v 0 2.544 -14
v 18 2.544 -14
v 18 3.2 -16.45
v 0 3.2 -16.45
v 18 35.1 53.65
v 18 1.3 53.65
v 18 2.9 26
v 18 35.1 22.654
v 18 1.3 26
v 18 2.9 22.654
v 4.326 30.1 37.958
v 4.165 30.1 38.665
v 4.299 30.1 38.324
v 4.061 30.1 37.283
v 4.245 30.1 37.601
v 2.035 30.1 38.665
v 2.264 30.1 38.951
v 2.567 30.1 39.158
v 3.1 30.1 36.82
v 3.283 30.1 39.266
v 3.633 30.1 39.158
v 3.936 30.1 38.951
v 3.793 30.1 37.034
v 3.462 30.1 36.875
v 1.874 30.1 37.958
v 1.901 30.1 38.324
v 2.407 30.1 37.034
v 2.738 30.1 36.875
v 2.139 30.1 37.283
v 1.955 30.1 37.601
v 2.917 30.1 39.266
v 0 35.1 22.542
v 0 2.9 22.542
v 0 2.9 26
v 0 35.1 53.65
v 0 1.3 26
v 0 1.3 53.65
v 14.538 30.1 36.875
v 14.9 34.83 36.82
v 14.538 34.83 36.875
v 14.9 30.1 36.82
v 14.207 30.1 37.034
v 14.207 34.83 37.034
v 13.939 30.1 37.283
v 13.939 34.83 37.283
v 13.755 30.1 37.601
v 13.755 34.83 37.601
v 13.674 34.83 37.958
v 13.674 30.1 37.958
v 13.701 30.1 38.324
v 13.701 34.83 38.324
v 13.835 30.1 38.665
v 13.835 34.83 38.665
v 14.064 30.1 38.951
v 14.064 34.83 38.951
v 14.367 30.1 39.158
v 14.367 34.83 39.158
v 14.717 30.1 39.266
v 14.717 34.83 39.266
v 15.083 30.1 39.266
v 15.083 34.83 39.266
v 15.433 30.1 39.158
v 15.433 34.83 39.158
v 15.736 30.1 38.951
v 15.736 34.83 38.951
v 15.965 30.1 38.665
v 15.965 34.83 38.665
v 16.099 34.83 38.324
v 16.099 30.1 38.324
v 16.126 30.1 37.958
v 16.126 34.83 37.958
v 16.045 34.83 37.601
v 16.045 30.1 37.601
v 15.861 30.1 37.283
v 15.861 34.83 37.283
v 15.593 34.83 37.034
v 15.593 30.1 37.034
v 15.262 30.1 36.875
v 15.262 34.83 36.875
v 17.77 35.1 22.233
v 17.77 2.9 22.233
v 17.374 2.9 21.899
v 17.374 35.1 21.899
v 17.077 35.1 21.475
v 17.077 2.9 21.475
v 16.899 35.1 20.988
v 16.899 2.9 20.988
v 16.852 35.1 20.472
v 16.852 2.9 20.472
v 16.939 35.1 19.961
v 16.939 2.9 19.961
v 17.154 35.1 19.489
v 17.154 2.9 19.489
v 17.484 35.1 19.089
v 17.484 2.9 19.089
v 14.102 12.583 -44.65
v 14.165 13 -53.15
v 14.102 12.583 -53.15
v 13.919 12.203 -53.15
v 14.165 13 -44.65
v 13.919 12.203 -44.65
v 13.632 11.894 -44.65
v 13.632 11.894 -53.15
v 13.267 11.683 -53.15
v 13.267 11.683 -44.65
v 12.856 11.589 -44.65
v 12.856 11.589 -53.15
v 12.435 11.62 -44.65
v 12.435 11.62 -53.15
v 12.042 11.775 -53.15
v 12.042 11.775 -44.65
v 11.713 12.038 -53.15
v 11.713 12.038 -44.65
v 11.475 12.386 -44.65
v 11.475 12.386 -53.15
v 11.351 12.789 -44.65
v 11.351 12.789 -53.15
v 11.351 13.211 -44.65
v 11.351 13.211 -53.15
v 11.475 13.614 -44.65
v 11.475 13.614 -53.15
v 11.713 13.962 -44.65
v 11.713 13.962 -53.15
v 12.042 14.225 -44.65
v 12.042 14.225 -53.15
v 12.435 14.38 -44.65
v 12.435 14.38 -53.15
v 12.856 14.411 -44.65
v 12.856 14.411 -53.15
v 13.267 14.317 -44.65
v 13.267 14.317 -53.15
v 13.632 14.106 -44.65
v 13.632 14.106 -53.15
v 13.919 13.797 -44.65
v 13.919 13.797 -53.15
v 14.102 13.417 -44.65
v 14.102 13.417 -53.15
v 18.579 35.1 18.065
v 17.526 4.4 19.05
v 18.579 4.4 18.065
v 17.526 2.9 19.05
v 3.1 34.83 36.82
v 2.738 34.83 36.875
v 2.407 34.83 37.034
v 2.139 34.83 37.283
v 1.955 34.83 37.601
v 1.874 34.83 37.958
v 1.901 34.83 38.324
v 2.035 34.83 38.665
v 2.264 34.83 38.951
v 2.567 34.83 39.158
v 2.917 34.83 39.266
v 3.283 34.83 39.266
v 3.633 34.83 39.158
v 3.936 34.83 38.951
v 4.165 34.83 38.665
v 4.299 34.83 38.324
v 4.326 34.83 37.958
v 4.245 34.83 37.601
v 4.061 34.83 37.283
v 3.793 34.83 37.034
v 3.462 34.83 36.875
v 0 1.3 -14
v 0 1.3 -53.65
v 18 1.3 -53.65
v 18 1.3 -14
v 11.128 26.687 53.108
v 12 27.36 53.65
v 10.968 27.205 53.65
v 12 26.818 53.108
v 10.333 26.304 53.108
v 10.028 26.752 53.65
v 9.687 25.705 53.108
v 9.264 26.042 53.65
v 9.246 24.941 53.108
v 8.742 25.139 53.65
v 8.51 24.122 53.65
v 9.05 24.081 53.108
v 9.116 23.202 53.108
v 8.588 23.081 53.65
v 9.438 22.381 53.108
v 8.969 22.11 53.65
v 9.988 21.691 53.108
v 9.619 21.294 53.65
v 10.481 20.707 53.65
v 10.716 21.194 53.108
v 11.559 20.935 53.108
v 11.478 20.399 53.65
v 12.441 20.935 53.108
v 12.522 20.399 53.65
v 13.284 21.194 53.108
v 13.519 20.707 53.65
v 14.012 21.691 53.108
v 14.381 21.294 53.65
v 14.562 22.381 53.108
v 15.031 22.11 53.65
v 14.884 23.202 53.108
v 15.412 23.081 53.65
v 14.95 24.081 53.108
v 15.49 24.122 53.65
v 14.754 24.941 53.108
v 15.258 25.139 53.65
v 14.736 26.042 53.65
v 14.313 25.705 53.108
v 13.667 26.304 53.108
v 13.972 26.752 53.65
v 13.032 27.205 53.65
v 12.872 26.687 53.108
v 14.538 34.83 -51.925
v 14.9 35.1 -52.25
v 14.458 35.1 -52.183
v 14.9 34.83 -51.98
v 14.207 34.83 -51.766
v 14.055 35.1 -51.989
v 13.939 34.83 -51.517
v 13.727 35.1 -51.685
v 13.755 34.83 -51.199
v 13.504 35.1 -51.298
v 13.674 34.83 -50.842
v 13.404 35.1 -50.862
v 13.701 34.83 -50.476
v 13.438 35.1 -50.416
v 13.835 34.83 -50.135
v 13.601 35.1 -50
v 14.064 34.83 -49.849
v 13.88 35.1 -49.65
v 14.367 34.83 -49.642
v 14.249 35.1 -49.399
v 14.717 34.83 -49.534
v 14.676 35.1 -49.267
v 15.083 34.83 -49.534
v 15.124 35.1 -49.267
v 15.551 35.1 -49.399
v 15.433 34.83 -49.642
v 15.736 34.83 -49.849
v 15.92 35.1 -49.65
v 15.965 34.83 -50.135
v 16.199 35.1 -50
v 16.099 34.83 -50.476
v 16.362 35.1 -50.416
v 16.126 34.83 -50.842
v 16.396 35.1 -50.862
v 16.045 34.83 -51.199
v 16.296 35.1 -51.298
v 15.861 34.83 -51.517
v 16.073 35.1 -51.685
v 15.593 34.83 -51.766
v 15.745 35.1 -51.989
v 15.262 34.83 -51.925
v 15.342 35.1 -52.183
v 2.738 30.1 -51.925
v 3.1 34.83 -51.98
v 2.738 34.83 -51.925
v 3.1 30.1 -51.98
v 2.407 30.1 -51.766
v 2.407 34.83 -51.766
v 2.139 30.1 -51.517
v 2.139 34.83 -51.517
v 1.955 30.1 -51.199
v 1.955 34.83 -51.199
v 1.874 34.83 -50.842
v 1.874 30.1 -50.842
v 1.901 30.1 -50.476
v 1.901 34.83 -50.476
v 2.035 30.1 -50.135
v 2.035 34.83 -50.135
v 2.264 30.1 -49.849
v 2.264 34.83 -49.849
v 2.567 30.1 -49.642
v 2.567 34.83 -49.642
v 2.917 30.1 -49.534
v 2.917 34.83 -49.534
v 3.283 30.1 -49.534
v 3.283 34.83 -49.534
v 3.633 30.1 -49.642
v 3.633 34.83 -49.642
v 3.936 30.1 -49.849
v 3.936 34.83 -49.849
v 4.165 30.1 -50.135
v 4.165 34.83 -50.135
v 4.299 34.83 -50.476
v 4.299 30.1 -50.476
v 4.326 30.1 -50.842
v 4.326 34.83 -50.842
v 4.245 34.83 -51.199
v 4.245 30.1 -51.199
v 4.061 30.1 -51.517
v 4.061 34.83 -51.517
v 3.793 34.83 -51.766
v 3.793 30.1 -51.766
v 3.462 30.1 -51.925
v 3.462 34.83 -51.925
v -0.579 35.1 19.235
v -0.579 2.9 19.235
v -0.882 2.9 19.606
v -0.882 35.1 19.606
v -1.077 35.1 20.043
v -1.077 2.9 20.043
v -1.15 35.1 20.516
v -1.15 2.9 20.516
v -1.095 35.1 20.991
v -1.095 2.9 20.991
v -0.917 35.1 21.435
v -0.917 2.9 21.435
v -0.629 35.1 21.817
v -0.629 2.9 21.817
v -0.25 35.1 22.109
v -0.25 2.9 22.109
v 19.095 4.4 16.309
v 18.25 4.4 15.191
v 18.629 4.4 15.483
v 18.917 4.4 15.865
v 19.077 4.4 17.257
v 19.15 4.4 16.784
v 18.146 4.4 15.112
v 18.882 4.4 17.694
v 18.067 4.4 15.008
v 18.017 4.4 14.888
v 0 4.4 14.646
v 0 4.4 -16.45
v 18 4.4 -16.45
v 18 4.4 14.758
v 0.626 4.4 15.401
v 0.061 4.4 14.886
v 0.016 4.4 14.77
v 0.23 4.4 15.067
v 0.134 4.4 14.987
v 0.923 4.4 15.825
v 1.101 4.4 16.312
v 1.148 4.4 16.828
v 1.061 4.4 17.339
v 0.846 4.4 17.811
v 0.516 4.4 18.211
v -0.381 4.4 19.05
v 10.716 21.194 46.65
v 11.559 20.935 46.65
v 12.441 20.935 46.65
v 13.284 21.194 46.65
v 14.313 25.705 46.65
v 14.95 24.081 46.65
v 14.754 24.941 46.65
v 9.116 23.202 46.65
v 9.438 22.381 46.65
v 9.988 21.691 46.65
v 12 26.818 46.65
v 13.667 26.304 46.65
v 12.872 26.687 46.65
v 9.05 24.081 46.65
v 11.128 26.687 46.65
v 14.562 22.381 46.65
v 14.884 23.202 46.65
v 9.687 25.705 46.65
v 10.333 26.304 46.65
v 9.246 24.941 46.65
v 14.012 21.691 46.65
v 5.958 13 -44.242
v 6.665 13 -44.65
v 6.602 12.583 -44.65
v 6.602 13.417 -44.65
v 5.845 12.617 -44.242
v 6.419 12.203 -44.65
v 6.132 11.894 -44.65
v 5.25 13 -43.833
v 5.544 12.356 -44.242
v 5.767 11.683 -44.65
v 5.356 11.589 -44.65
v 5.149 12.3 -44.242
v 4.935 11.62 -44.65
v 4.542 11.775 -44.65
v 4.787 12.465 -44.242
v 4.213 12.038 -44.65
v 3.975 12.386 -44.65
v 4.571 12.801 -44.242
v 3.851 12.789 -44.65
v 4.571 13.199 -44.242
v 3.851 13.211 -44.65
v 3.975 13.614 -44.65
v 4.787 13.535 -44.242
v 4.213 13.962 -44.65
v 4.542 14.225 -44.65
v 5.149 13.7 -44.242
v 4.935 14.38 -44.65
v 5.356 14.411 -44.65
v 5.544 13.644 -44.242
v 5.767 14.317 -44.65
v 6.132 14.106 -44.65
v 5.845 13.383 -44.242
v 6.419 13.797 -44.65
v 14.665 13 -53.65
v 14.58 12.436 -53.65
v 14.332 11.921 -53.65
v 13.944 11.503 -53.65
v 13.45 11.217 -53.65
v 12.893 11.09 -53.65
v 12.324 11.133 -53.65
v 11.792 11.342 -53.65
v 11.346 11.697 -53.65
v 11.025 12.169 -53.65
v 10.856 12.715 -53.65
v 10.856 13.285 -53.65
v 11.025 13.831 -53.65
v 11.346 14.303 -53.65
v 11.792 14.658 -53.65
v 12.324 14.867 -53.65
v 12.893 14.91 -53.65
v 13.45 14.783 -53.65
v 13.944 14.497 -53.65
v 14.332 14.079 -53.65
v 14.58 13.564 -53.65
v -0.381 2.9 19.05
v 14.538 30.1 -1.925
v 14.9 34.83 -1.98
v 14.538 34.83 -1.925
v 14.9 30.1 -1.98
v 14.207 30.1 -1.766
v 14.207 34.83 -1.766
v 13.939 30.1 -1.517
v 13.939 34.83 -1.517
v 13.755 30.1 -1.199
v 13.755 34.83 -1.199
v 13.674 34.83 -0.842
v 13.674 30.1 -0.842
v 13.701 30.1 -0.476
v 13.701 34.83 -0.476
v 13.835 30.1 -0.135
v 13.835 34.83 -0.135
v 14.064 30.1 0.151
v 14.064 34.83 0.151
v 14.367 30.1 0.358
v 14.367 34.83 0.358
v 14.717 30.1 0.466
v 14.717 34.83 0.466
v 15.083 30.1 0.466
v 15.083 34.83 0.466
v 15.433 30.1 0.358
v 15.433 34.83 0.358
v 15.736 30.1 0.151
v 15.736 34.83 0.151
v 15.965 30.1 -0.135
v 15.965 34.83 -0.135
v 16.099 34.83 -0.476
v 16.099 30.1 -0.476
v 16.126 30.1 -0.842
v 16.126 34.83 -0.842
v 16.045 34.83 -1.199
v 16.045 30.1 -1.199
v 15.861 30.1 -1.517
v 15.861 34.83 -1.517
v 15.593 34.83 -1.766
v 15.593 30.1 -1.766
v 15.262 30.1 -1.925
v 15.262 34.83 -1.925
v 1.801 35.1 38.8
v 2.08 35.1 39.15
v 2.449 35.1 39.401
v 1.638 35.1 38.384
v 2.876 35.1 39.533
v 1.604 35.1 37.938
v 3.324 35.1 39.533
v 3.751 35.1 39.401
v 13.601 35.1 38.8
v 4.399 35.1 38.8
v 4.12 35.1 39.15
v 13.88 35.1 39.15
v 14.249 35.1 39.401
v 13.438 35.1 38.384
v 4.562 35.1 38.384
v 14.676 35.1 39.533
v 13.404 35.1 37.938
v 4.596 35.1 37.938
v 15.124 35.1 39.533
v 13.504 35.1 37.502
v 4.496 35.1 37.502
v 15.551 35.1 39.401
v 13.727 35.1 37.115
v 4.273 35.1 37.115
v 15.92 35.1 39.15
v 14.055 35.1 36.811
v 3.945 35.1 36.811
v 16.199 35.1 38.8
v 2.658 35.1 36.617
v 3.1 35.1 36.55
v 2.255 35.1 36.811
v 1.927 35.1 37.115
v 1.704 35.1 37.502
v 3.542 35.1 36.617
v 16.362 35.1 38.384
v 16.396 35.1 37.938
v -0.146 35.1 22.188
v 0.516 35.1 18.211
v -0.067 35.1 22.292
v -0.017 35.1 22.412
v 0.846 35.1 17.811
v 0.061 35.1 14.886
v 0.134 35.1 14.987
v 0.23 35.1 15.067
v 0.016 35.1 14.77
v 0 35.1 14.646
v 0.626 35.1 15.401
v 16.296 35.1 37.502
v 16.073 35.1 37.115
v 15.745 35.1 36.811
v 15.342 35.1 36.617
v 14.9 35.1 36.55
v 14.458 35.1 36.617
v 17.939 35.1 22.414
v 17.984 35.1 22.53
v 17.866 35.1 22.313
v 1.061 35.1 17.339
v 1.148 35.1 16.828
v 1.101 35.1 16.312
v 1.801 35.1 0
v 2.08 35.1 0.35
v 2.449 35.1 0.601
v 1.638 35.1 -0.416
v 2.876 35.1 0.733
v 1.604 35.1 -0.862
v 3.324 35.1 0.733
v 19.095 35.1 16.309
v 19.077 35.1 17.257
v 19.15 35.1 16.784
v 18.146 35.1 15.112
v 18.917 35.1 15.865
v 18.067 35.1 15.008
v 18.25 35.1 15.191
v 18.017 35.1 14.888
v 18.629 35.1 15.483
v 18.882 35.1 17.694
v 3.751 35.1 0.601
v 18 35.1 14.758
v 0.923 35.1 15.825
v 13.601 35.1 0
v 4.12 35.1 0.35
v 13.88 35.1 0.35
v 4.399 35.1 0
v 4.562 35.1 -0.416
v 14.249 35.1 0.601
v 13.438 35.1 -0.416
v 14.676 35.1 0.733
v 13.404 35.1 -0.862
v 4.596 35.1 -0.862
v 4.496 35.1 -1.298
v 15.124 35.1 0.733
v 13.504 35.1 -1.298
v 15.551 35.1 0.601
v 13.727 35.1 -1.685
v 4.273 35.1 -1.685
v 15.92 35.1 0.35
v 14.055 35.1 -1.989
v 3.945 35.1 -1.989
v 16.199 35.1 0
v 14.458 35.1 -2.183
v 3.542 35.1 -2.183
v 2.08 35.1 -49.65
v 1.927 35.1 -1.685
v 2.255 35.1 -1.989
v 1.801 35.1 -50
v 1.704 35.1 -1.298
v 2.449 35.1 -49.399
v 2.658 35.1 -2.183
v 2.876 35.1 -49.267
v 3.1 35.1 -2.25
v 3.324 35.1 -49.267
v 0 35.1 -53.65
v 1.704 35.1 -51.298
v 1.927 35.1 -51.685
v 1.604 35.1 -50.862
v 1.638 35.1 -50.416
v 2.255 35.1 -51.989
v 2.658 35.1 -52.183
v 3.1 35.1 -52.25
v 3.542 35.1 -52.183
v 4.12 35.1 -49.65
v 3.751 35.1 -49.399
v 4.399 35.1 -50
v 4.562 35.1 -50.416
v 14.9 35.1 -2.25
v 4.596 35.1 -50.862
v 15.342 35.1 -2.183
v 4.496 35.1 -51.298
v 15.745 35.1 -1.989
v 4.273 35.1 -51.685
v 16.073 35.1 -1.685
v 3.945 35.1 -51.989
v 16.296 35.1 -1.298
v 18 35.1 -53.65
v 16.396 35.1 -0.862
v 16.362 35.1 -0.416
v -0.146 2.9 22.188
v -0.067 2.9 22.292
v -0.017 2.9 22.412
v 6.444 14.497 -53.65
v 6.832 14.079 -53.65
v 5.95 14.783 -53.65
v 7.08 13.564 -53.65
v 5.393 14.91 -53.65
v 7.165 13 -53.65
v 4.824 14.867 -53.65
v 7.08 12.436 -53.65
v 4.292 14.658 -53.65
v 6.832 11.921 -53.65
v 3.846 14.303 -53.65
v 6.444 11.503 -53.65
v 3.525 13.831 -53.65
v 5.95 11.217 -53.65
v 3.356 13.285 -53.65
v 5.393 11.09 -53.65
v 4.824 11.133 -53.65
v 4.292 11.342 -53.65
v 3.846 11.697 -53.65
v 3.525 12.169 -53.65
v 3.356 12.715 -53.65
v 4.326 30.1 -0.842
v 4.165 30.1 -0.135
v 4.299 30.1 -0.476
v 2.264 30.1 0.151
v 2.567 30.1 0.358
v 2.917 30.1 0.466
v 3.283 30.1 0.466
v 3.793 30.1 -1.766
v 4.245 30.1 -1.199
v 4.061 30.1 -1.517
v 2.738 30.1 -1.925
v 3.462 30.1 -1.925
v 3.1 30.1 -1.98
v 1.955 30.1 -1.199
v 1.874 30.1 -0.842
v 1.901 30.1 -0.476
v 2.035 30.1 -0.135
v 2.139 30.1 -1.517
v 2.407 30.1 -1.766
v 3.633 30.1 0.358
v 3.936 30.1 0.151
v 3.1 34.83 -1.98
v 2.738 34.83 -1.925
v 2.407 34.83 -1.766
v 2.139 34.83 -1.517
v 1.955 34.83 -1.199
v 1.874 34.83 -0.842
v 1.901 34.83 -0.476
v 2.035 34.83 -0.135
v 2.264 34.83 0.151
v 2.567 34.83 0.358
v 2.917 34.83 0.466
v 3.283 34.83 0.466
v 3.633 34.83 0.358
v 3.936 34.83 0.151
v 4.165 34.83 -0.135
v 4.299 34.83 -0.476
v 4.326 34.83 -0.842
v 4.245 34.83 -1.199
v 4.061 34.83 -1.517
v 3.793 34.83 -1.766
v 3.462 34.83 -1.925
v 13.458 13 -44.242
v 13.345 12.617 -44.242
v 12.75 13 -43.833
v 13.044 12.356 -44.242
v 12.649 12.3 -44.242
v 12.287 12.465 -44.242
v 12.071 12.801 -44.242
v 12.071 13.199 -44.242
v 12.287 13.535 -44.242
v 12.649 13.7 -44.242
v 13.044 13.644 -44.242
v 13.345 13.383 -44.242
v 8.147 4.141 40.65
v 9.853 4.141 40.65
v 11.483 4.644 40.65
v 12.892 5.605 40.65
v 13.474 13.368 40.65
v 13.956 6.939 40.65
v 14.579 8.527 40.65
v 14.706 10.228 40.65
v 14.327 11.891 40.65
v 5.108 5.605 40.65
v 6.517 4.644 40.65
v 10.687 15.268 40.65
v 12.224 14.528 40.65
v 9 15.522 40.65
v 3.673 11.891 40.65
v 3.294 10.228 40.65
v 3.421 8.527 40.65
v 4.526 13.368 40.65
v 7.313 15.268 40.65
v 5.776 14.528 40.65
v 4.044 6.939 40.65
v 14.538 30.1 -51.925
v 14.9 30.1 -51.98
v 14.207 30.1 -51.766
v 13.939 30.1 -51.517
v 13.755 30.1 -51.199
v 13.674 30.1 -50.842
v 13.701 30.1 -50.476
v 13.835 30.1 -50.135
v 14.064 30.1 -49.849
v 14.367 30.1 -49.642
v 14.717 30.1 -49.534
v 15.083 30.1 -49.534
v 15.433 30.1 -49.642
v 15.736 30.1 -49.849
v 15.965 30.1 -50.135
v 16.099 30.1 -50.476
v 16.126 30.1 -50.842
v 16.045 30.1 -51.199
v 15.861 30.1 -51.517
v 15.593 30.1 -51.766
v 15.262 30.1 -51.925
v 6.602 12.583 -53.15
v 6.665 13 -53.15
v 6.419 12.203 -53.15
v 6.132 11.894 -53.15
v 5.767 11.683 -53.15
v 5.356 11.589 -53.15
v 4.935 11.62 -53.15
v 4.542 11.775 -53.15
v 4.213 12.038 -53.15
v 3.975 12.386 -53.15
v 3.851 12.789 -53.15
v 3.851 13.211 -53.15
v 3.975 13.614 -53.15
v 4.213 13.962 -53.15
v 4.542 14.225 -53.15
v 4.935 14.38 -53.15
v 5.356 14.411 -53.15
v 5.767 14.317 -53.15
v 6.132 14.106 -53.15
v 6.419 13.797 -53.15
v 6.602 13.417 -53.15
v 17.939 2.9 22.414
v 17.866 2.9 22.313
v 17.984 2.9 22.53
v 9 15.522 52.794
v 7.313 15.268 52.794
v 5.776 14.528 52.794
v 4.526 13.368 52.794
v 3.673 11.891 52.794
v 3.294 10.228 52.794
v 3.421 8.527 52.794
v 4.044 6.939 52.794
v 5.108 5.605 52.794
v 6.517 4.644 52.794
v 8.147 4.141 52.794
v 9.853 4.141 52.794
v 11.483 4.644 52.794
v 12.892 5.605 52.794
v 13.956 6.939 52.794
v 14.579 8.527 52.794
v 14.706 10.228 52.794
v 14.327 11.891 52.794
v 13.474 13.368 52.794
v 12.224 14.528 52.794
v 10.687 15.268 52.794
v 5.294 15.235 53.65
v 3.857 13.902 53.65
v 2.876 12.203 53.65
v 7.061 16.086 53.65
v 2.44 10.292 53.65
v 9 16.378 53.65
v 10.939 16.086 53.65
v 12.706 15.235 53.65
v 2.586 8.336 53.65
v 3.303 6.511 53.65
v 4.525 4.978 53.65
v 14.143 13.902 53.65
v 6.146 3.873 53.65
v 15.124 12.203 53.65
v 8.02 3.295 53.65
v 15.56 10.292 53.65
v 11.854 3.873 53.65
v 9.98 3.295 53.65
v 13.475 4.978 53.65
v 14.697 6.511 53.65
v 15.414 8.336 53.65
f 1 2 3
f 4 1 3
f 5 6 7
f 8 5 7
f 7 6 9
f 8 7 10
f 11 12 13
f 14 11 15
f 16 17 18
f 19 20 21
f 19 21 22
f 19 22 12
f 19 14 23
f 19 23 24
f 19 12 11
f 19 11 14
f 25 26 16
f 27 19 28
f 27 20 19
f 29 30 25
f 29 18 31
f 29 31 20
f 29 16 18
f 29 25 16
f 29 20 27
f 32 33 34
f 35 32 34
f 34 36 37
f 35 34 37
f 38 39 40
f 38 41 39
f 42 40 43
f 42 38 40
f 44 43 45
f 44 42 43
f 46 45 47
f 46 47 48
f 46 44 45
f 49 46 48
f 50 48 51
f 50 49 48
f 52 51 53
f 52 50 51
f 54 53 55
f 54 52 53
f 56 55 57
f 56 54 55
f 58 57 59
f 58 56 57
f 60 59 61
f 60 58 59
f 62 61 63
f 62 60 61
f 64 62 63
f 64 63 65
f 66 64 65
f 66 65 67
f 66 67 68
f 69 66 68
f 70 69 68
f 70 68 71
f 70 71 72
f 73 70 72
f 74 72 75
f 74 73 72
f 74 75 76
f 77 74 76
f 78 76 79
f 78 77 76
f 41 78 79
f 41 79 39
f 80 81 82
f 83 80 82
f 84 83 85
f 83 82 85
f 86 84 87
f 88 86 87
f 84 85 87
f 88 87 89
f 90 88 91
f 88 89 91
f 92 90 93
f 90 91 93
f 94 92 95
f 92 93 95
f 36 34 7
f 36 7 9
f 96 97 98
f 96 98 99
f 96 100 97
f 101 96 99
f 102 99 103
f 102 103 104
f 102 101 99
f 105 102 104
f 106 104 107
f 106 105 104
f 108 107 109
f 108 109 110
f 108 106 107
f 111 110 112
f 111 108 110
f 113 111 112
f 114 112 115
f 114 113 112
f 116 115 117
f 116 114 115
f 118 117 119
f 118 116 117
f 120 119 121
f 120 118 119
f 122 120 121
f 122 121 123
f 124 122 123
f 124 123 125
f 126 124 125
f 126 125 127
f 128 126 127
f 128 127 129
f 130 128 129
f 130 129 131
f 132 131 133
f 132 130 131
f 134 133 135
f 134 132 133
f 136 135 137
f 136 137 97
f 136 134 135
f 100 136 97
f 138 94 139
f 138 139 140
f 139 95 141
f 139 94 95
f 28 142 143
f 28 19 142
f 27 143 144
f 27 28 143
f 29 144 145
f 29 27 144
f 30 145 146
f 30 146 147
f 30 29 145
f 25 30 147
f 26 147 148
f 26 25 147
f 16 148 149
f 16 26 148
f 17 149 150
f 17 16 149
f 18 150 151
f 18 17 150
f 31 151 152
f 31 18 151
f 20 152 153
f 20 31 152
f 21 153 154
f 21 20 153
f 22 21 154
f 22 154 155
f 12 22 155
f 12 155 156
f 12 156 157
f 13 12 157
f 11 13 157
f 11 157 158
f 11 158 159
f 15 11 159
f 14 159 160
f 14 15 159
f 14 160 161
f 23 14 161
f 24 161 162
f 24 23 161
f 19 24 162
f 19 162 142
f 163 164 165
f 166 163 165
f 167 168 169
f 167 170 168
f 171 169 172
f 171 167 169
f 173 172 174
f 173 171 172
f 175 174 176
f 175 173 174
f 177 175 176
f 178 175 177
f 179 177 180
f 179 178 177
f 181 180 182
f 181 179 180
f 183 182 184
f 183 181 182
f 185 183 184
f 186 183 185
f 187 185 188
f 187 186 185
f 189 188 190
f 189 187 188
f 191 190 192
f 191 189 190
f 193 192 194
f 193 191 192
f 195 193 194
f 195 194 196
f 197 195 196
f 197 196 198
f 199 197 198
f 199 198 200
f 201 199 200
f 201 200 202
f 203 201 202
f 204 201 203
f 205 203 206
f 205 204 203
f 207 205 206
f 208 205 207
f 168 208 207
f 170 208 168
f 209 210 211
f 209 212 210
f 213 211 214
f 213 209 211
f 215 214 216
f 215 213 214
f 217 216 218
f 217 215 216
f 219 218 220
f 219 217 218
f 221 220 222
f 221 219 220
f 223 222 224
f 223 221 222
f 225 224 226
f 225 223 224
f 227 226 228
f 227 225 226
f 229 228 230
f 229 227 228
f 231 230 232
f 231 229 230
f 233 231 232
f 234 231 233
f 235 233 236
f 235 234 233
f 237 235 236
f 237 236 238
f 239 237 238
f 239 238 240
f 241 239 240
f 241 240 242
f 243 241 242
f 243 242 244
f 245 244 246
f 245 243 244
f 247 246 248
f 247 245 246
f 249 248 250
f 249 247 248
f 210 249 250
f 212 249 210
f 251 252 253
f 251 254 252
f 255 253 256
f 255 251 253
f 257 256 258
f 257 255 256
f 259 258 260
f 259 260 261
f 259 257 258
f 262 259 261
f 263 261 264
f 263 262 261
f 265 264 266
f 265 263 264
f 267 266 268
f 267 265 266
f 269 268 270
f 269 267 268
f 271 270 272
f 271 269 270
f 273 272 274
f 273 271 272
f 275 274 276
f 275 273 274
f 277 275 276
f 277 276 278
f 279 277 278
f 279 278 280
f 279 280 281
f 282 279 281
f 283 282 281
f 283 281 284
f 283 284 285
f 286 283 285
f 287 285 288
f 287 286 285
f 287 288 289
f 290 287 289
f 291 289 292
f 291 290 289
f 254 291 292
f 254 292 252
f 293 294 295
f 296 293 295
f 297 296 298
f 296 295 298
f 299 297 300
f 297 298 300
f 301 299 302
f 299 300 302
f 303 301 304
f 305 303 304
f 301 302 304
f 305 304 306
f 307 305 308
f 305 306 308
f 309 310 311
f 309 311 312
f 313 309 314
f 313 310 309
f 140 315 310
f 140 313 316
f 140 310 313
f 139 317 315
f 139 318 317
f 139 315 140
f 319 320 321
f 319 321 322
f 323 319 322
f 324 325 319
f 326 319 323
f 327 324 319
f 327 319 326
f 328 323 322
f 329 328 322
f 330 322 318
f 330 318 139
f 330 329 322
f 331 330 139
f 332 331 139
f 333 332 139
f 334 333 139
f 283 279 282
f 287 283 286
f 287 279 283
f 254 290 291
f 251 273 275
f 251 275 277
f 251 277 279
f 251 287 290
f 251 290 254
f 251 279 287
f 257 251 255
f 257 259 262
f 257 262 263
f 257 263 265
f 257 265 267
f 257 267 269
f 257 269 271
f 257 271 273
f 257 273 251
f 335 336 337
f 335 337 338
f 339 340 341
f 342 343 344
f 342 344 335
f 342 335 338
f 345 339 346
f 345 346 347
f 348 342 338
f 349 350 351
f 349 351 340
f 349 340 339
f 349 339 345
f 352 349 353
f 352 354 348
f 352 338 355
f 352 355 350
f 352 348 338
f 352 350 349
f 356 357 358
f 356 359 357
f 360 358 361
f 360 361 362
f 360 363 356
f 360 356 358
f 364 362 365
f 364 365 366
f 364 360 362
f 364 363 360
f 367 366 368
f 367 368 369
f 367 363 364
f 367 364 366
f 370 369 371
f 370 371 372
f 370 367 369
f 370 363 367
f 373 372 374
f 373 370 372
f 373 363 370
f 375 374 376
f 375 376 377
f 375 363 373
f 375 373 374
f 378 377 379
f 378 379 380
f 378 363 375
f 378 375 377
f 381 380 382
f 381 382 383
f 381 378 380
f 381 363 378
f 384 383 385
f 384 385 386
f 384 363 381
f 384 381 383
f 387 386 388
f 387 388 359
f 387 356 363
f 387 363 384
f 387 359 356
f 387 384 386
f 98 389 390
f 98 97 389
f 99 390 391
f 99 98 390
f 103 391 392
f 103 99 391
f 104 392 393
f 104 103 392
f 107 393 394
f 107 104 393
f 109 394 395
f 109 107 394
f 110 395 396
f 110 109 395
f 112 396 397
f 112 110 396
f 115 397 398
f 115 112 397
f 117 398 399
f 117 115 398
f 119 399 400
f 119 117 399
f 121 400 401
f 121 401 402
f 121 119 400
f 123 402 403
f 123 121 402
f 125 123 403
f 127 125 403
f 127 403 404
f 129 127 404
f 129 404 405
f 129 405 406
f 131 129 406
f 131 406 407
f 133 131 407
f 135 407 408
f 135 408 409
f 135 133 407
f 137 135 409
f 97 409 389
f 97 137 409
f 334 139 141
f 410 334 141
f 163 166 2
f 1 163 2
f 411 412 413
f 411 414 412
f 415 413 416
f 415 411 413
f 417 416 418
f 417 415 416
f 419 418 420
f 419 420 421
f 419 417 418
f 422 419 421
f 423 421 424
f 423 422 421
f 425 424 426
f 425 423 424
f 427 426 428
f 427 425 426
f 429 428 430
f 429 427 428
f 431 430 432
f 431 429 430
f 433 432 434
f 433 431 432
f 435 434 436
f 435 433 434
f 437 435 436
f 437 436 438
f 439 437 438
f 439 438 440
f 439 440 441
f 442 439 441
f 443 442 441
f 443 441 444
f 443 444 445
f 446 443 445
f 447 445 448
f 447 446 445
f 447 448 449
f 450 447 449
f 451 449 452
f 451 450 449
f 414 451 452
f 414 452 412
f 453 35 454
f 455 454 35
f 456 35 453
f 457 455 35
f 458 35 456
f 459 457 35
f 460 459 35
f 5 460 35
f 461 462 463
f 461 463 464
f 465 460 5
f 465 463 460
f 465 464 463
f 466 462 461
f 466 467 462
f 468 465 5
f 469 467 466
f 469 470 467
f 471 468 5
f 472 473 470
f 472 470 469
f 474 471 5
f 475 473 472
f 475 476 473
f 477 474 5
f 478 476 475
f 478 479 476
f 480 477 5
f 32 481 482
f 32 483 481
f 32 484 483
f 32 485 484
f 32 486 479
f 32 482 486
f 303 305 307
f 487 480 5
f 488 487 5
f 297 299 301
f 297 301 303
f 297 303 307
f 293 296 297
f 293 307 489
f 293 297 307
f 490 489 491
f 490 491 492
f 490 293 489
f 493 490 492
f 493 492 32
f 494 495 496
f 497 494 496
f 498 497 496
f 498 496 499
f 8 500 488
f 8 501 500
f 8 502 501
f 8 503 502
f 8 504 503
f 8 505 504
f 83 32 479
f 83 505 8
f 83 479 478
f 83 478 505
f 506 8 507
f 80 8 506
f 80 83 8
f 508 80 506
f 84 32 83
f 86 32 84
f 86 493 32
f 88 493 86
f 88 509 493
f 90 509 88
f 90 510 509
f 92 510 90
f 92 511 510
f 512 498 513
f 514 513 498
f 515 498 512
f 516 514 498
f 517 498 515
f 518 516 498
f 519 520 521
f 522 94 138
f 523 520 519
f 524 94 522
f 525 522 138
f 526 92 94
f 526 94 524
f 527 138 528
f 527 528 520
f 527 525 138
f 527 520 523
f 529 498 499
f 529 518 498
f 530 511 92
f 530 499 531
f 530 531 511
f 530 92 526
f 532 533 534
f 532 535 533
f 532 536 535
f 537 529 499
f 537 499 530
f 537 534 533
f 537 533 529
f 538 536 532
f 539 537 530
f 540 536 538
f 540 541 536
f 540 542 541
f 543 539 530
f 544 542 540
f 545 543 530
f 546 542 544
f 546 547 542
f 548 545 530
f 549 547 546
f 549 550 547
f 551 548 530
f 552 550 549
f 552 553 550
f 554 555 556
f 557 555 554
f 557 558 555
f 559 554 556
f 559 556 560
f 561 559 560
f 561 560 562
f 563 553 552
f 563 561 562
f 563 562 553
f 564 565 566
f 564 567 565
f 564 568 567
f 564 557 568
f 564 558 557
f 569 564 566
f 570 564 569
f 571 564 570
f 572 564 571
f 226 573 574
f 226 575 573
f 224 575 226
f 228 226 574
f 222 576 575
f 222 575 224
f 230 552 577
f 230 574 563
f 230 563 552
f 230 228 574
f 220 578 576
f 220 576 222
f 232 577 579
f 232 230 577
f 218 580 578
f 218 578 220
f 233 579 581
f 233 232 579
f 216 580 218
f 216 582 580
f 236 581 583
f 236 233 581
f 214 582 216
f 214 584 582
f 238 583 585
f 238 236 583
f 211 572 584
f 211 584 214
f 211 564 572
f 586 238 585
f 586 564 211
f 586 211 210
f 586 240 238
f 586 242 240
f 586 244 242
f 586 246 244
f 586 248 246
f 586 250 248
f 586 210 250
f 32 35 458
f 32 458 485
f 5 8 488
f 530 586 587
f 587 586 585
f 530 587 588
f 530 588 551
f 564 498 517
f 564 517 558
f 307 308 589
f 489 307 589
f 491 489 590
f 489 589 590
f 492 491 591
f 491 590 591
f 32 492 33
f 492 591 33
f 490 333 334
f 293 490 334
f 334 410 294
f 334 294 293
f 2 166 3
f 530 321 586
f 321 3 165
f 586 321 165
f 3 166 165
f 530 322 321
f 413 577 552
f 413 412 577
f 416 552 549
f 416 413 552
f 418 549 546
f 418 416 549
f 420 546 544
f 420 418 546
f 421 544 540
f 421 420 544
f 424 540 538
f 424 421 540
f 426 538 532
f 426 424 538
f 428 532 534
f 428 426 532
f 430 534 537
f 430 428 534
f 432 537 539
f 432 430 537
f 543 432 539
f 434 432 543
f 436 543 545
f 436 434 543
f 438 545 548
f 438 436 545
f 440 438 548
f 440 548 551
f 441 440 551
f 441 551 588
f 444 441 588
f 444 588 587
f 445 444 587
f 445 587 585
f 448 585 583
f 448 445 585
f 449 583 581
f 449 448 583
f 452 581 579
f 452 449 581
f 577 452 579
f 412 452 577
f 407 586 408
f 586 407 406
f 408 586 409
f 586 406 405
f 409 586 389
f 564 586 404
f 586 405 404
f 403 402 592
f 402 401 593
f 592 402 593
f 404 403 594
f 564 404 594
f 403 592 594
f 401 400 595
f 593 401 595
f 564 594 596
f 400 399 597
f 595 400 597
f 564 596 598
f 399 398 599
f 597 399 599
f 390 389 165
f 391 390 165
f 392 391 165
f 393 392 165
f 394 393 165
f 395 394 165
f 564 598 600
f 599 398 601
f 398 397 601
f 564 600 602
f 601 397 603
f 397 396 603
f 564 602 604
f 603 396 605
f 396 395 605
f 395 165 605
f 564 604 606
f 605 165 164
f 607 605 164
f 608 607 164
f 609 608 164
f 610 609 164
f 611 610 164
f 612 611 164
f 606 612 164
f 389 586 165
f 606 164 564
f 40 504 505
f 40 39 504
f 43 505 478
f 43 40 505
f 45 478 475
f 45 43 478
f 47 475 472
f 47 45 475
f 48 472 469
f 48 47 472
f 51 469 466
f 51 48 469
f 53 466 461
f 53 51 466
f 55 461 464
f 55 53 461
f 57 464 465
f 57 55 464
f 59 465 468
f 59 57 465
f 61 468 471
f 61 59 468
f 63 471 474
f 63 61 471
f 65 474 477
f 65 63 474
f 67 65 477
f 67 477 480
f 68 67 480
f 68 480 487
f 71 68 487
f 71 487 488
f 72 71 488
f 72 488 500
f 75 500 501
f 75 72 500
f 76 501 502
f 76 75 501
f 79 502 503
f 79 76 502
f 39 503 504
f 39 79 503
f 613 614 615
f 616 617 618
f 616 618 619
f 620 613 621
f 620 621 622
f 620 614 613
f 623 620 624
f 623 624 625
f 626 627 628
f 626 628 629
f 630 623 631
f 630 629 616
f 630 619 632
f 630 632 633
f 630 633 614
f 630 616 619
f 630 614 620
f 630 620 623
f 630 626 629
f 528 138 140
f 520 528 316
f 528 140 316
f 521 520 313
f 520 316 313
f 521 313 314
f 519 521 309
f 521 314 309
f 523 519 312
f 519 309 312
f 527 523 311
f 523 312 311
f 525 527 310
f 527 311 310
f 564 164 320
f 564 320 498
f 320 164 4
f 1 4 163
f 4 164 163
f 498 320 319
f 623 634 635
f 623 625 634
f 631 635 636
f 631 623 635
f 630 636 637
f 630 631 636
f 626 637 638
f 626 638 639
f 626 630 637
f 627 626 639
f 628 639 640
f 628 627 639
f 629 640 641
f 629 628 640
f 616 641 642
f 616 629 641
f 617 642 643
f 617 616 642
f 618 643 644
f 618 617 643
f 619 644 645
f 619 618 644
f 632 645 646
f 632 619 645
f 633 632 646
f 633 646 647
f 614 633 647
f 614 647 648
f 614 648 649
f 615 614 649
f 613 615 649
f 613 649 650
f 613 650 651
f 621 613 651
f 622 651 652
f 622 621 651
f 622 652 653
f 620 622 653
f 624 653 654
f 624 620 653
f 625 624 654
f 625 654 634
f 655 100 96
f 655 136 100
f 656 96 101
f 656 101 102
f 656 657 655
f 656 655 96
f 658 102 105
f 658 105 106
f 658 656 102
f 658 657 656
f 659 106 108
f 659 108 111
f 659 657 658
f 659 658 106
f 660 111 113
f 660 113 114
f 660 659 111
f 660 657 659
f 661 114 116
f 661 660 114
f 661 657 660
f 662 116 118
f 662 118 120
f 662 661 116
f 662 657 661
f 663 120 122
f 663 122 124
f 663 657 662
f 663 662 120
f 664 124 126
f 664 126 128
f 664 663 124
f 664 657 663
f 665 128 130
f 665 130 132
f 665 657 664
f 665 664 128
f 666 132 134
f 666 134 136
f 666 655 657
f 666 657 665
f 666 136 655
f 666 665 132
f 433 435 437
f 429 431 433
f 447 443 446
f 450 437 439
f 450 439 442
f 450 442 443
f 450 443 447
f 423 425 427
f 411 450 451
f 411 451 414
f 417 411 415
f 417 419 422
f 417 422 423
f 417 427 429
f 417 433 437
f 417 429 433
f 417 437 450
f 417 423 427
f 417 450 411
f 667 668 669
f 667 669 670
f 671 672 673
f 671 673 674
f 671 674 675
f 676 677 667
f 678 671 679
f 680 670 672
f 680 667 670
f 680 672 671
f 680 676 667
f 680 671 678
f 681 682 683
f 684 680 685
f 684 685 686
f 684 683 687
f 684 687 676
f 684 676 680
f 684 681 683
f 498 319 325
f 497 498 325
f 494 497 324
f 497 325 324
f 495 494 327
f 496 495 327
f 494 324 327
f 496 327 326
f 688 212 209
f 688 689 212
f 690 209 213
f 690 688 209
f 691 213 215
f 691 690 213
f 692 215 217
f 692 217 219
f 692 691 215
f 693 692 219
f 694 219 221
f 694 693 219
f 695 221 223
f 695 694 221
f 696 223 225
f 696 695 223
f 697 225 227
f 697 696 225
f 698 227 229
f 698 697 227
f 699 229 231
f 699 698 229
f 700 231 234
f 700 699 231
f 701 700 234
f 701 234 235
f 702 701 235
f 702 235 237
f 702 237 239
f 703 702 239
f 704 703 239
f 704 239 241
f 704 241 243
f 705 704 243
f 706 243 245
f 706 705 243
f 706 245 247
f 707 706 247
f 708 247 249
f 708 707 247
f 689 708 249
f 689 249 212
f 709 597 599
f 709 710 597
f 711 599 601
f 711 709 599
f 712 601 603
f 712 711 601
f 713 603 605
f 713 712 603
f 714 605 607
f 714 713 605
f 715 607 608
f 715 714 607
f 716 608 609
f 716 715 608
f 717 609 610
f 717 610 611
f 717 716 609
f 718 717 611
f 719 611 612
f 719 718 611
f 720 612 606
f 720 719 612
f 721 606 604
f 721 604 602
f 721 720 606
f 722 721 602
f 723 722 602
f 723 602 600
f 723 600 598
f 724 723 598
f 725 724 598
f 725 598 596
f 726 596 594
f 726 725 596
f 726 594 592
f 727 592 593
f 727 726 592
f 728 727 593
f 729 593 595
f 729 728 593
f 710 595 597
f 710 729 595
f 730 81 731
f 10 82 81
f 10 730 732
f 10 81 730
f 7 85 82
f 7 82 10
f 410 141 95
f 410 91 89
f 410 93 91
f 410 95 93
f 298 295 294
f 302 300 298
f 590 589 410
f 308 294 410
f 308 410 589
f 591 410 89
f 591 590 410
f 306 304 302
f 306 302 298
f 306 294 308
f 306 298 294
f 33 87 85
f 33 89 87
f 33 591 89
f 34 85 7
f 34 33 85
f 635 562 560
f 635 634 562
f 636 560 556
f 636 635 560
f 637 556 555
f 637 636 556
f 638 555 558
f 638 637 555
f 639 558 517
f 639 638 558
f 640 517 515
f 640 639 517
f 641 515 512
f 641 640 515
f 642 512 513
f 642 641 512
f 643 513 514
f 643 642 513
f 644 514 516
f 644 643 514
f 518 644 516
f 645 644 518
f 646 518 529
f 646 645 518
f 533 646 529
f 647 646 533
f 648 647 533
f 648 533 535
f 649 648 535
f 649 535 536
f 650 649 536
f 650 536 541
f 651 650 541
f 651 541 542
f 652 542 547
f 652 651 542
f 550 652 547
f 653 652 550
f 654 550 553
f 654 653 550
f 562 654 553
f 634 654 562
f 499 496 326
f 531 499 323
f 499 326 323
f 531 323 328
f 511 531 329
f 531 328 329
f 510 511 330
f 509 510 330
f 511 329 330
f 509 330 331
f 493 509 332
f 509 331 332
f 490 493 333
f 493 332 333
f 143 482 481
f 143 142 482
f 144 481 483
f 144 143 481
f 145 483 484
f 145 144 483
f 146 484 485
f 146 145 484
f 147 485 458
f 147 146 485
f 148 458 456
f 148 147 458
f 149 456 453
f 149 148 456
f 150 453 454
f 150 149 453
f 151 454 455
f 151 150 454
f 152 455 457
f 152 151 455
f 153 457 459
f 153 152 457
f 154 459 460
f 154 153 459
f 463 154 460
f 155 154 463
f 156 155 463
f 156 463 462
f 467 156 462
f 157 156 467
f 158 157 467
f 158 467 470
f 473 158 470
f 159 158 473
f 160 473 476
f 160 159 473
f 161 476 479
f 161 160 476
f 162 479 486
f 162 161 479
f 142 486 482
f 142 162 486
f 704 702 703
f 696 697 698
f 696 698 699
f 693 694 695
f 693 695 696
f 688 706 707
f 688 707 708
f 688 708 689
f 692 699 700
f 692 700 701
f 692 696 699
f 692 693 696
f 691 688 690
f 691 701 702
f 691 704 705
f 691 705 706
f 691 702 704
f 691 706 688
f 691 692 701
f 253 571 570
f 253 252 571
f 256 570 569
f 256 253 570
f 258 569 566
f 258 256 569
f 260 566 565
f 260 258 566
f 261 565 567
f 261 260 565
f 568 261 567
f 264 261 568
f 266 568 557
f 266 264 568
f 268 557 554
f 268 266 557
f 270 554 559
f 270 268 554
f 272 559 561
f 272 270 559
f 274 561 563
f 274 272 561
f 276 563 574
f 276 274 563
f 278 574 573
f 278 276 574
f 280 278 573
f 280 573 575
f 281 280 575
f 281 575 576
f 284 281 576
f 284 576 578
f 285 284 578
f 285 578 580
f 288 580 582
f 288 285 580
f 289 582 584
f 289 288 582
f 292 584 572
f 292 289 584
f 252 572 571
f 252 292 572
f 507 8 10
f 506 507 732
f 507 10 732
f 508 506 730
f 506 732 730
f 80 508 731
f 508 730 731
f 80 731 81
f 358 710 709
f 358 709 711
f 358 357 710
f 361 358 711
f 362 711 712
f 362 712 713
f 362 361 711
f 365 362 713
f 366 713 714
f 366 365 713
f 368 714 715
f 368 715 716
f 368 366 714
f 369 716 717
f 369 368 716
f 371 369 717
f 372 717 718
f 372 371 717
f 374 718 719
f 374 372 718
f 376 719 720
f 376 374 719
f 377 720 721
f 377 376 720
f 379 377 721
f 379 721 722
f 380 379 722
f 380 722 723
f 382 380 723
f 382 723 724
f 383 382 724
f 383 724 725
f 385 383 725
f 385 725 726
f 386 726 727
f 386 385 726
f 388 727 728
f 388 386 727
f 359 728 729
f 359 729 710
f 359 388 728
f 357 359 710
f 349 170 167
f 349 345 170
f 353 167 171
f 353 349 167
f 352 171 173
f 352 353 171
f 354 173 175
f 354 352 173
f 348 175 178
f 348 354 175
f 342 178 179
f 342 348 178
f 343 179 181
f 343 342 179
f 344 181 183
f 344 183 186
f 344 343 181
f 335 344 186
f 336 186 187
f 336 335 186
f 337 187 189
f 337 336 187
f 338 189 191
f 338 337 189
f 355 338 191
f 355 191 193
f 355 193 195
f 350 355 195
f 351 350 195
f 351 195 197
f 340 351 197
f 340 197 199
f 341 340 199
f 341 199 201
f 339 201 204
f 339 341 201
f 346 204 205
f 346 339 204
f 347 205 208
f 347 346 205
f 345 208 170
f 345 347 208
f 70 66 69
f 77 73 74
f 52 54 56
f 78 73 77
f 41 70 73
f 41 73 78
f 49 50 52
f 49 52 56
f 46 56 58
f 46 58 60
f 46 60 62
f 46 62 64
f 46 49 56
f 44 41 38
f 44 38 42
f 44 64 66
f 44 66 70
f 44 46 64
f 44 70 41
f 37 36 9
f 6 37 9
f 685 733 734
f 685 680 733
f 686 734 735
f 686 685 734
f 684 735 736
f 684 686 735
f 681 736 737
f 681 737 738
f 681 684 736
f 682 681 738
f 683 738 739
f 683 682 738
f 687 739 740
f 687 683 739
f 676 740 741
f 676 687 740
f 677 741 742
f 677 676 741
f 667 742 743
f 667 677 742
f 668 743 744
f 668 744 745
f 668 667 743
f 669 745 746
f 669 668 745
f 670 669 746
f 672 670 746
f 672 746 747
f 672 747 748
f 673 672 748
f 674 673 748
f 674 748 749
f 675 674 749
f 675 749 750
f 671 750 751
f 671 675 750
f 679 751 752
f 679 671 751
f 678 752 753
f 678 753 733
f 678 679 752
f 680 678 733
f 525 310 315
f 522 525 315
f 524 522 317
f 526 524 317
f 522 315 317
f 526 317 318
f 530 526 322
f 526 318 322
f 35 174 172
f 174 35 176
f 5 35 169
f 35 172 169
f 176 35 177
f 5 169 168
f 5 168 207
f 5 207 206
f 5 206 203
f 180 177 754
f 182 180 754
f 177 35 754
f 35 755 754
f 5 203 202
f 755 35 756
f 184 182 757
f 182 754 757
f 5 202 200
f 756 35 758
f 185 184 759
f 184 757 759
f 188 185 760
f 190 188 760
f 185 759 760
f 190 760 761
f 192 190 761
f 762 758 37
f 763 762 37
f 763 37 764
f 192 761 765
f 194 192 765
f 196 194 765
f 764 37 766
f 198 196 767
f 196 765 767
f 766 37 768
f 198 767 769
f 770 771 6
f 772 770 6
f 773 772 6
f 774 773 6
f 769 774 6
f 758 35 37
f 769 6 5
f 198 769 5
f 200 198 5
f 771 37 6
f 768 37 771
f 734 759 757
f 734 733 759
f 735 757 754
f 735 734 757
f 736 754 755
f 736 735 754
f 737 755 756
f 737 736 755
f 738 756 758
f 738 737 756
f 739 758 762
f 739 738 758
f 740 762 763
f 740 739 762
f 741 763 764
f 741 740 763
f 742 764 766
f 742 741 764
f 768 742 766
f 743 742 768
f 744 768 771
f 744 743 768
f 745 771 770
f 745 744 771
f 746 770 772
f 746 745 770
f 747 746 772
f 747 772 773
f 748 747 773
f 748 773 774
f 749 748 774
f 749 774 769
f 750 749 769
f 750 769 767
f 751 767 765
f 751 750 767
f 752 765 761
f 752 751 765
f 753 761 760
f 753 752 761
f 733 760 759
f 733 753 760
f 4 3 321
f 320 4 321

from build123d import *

# Parameters (mm, degrees)
BOSS_EXTRUDE1_DEPTH     = 33.8
CUT_EXTRUDE1_DEPTH      = 23
CUT_EXTRUDE1_DEPTH_BACK = 23


with BuildPart() as part:
    # Sketch1 → Boss-Extrude1 (new body)
    with BuildSketch(Plane(origin=(0, 1.3, 0), x_dir=(1, 0, 0), z_dir=(0, 1, 0))):
        with BuildLine():
            Line((0, -22.541858429), (0, -53.65))
            Line((0, -53.65), (18, -53.65))
            Line((18, -53.65), (18, -22.654162541))
            ThreePointArc((18, -22.654162541), (17.938748215, -22.414370958), (17.769999986, -22.233330024))
            ThreePointArc((17.769999986, -22.233330024), (16.858228534, -20.731235829), (17.483912522, -19.089245057))
            Line((17.483912522, -19.089245057), (18.57947873, -18.064679449))
            ThreePointArc((18.57947873, -18.064679449), (19.138283161, -16.544955286), (18.250000071, -15.191154314))
            ThreePointArc((18.250000071, -15.191154314), (18.066987319, -15.008141607), (18, -14.758141571))
            Line((18, -14.758141571), (18, 53.65))
            Line((18, 53.65), (0, 53.65))
            Line((0, 53.65), (0, -14.645837459))
            ThreePointArc((0, -14.645837459), (0.061251781, -14.885629035), (0.23, -15.066669967))
            ThreePointArc((0.23, -15.066669967), (1.141771466, -16.568764162), (0.516087478, -18.210754943))
            Line((0.516087478, -18.210754943), (-0.57947873, -19.235320551))
            ThreePointArc((-0.57947873, -19.235320551), (-1.138283159, -20.755044733), (-0.250000037, -22.108845706))
            ThreePointArc((-0.250000037, -22.108845706), (-0.066987309, -22.29185841), (0, -22.541858429))
        make_face()
    extrude(amount=BOSS_EXTRUDE1_DEPTH)

    # Sketch2 → Cut-Extrude1 (cut, two sides)
    with BuildSketch(Plane(origin=(0, 0, 0), x_dir=(0, 0, -1), z_dir=(1, 0, 0))) as cut_extrude1_sk:
        Polygon((-26, 2.9), (-26, -8.174443219), (14, -7.963716906), (14, 2.543524479), (16.45, 3.2), (16.45, 4.4), (-19.05, 4.4), (-19.05, 2.9), align=None)
    extrude(amount=CUT_EXTRUDE1_DEPTH, mode=Mode.SUBTRACT)
    extrude(cut_extrude1_sk.sketch, amount=-CUT_EXTRUDE1_DEPTH_BACK, mode=Mode.SUBTRACT)

    # Sketch3 → Cut-Revolve1 (revolve, cut)
    with BuildSketch(Plane(origin=(9, 0, 0), x_dir=(0, 0, -1), z_dir=(1, 0, 0))):
        Polygon((-53.65, 9.8), (-53.65, 16.3785), (-52.794, 15.5225), (-40.65, 15.5225), (-40.65, 9.8), align=None)
    revolve(axis=Axis((9, 9.8, 40.65), (0, 0, 1)), mode=Mode.SUBTRACT)

    # Sketch4 → Cut-Revolve2 (revolve, cut)
    with BuildSketch(Plane(origin=(12, 0, 0), x_dir=(0, 0, -1), z_dir=(1, 0, 0))):
        Polygon((-53.65, 23.86), (-53.65, 27.36), (-53.1085, 26.8185), (-46.65, 26.8185), (-46.65, 23.86), align=None)
    revolve(axis=Axis((12, 23.86, 46.65), (0, 0, 1)), mode=Mode.SUBTRACT)

    # Sketch5 → Cut-Revolve3 (revolve, cut)
    with BuildSketch(Plane(origin=(3.1, 0, 0), x_dir=(0, 0, -1), z_dir=(1, 0, 0))):
        Polygon((-38.05, 35.1), (-36.55, 35.1), (-36.8205, 34.8295), (-36.8205, 30.1), (-38.05, 30.1), align=None)
    revolve(axis=Axis((3.1, 30.1, 38.05), (0, 1, 0)), mode=Mode.SUBTRACT)

    # Sketch6 → Cut-Revolve4 (revolve, cut)
    with BuildSketch(Plane(origin=(3.1, 0, 0), x_dir=(0, 0, -1), z_dir=(1, 0, 0))):
        Polygon((0.75, 35.1), (2.25, 35.1), (1.9795, 34.8295), (1.9795, 30.1), (0.75, 30.1), align=None)
    revolve(axis=Axis((3.1, 30.1, -0.75), (0, 1, 0)), mode=Mode.SUBTRACT)

    # Sketch7 → Cut-Revolve5 (revolve, cut)
    with BuildSketch(Plane(origin=(3.1, 0, 0), x_dir=(0, 0, -1), z_dir=(1, 0, 0))):
        Polygon((50.75, 35.1), (52.25, 35.1), (51.9795, 34.8295), (51.9795, 30.1), (50.75, 30.1), align=None)
    revolve(axis=Axis((3.1, 30.1, -50.75), (0, 1, 0)), mode=Mode.SUBTRACT)

    # Sketch8 → Cut-Revolve6 (revolve, cut)
    with BuildSketch(Plane(origin=(14.9, 0, 0), x_dir=(0, 0, -1), z_dir=(1, 0, 0))):
        Polygon((-38.05, 35.1), (-36.55, 35.1), (-36.8205, 34.8295), (-36.8205, 30.1), (-38.05, 30.1), align=None)
    revolve(axis=Axis((14.9, 30.1, 38.05), (0, 1, 0)), mode=Mode.SUBTRACT)

    # Sketch9 → Cut-Revolve7 (revolve, cut)
    with BuildSketch(Plane(origin=(14.9, 0, 0), x_dir=(0, 0, -1), z_dir=(1, 0, 0))):
        Polygon((0.75, 35.1), (2.25, 35.1), (1.9795, 34.8295), (1.9795, 30.1), (0.75, 30.1), align=None)
    revolve(axis=Axis((14.9, 30.1, -0.75), (0, 1, 0)), mode=Mode.SUBTRACT)

    # Sketch10 → Cut-Revolve8 (revolve, cut)
    with BuildSketch(Plane(origin=(14.9, 0, 0), x_dir=(0, 0, -1), z_dir=(1, 0, 0))):
        Polygon((50.75, 35.1), (52.25, 35.1), (51.9795, 34.8295), (51.9795, 30.1), (50.75, 30.1), align=None)
    revolve(axis=Axis((14.9, 30.1, -50.75), (0, 1, 0)), mode=Mode.SUBTRACT)

    # Sketch11 → Cut-Revolve9 (revolve, cut)
    with BuildSketch(Plane(origin=(0, 13, 0), x_dir=(1, 0, 0), z_dir=(0, 1, 0))):
        Polygon((12.75, 53.65), (14.665, 53.65), (14.165, 53.15), (14.165, 44.65), (12.75, 43.833049369), align=None)
    revolve(axis=Axis((12.75, 13, -43.833049369), (0, 0, -1)), mode=Mode.SUBTRACT)

    # Sketch12 → Cut-Revolve10 (revolve, cut)
    with BuildSketch(Plane(origin=(0, 13, 0), x_dir=(1, 0, 0), z_dir=(0, 1, 0))):
        Polygon((5.25, 53.65), (7.165, 53.65), (6.665, 53.15), (6.665, 44.65), (5.25, 43.833049369), align=None)
    revolve(axis=Axis((5.25, 13, -43.833049369), (0, 0, -1)), mode=Mode.SUBTRACT)


solid = part.part
